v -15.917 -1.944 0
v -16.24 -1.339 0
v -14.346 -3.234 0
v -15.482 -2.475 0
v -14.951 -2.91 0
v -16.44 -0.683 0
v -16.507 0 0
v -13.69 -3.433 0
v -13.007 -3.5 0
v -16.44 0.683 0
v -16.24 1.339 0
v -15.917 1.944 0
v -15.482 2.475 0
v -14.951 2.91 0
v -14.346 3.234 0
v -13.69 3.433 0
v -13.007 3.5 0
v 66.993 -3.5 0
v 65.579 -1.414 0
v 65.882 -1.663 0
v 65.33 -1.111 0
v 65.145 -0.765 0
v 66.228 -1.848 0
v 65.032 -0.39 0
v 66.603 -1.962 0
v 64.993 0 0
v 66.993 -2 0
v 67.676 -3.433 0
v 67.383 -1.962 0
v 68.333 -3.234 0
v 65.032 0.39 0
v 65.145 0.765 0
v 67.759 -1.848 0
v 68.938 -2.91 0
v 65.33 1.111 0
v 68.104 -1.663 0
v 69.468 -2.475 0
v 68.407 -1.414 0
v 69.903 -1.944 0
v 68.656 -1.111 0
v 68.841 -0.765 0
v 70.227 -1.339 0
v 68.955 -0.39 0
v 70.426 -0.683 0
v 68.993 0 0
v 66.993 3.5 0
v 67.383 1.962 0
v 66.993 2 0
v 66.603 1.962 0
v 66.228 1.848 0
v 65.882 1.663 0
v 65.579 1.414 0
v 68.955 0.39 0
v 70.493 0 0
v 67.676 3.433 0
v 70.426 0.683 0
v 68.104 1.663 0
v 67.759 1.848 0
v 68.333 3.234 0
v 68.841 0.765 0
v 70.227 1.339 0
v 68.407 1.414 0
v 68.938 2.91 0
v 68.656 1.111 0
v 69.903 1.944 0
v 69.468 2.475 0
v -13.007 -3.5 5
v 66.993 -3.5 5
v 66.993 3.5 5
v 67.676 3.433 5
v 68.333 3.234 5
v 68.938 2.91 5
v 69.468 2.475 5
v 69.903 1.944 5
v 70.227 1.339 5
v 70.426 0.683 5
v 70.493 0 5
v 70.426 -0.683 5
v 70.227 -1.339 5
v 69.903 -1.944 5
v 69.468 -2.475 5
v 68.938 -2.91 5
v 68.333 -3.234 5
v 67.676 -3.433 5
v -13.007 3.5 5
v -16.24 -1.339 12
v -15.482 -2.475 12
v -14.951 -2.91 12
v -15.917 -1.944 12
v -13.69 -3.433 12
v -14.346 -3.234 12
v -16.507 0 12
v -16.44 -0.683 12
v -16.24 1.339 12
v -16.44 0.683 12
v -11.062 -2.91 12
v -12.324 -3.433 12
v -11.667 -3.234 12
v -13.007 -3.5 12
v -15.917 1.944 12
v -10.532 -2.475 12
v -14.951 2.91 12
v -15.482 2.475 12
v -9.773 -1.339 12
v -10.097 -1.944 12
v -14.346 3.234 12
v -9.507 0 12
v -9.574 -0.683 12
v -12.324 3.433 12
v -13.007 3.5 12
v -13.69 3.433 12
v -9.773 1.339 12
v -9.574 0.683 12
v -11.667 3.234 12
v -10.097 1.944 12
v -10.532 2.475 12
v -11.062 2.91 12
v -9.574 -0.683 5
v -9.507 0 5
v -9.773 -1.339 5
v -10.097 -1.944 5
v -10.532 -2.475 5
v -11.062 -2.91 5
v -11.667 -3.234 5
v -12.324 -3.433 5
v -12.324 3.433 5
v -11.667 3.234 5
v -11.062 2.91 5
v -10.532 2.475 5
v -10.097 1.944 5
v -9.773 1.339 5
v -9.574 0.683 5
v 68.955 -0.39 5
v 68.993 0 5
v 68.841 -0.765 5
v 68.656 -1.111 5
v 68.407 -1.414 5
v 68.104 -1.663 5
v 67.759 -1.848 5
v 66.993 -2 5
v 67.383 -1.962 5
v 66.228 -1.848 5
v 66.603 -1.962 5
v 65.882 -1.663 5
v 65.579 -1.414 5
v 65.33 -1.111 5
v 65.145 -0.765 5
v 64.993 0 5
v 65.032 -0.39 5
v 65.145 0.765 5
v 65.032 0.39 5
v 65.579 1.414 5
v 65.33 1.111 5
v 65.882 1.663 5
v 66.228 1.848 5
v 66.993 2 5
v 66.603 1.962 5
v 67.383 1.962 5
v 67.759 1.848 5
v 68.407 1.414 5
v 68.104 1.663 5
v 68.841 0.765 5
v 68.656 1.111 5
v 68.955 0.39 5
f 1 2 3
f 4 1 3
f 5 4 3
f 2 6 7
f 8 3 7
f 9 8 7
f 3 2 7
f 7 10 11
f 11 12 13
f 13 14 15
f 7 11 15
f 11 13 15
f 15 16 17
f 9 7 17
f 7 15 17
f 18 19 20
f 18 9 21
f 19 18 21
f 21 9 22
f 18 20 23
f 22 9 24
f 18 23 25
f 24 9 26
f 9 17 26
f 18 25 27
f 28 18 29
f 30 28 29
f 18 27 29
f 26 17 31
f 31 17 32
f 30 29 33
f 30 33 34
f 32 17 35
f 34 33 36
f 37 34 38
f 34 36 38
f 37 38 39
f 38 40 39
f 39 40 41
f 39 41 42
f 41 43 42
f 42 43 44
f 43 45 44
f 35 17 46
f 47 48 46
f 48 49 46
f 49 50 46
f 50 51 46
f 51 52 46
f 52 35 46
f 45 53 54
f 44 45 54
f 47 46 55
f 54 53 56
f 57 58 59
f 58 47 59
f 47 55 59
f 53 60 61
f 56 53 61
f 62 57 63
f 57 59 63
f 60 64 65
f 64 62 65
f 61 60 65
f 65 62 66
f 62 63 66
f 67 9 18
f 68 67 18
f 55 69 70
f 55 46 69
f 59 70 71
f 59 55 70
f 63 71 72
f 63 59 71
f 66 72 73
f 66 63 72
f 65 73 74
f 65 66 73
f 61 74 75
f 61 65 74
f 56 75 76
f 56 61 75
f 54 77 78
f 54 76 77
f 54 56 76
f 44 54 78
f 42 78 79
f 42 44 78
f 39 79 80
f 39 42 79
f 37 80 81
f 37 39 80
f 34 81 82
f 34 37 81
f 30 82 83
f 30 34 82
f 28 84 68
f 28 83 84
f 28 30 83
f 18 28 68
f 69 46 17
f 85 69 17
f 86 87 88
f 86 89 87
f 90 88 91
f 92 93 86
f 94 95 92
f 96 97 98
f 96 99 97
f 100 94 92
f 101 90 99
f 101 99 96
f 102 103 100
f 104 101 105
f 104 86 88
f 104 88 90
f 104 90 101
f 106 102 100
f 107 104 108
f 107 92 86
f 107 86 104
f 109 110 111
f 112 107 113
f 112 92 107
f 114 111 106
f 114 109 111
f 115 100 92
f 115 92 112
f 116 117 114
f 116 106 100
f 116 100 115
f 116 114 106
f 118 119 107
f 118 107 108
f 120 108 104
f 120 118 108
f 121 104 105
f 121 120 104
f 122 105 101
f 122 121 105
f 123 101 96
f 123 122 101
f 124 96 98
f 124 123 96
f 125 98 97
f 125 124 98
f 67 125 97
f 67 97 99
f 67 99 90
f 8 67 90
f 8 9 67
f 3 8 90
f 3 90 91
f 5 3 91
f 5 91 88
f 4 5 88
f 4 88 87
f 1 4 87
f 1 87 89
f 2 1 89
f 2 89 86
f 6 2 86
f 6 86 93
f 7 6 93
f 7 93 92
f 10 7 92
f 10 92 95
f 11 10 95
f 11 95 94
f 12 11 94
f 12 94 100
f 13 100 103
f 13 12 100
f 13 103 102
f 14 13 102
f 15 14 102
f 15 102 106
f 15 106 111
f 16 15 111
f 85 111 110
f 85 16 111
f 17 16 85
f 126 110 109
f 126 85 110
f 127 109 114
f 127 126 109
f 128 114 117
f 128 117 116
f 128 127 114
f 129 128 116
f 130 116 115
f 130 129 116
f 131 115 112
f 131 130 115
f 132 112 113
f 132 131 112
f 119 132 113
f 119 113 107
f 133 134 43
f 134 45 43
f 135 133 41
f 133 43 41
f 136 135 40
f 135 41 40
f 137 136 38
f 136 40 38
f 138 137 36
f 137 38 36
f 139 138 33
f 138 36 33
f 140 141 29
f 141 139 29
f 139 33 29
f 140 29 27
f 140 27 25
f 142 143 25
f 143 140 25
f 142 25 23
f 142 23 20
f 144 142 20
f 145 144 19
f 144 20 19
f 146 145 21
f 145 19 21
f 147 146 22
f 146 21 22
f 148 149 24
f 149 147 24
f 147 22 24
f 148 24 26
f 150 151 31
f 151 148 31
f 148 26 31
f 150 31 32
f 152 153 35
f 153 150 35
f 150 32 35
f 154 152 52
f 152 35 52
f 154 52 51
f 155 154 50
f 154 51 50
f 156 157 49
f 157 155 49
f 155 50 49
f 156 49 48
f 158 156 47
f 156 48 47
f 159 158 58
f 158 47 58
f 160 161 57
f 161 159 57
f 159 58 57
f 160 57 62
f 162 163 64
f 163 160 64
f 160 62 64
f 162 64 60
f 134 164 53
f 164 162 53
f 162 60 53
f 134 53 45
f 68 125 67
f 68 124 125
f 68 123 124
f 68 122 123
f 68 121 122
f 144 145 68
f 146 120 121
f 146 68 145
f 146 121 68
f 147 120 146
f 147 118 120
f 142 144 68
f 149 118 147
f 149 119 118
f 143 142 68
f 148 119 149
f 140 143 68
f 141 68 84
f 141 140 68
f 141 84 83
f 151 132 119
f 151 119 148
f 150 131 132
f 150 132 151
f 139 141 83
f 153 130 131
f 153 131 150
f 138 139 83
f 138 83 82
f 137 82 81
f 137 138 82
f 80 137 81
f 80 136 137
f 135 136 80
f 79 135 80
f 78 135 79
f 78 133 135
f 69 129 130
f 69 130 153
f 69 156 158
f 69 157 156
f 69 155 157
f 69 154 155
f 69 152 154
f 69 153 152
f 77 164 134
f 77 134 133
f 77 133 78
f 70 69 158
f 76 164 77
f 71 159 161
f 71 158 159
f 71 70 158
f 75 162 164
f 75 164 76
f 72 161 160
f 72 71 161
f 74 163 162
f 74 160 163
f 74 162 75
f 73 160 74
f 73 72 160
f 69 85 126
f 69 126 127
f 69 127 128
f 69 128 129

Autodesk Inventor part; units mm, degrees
ref_plane "YZ Plane" through (0, 0, 0) normal (1, 0, 0) x (0, 1, 0)
ref_plane "XZ Plane" through (0, 0, 0) normal (0, 1, 0) x (-1, 0, 0)
ref_plane "XY Plane" through (0, 0, 0) normal (0, 0, 1) x (1, 0, 0)
sketch "Boceto1" plane through (0, 0, 0) normal (0, 0, 1) x (1, 0, 0)
  line L0 (-13.0068, 0) -> (66.9932, 0) construction
  line L1 (-13.0068, -3.5) -> (66.9932, -3.5)
  line L2 (66.9932, 3.5) -> (-13.0068, 3.5)
  arc A0 (-13.0068, 3.5) -> (-13.0068, -3.5) centre (-13.0068, 0) ccw
  arc A1 (66.9932, -3.5) -> (66.9932, 3.5) centre (66.9932, 0) ccw
  circle A2 centre (66.9932, 0) radius 2
  point P0 (0, 0)
  point P1 (26.9932, 0)
  dimension "d0" = 80
  dimension "d1" = 7
  dimension "d2" = 4
extrude "Extrusión1" add sketch "Boceto1" along normal blind 5
sketch "Boceto3" plane through (0, 0, 5) normal (0, 0, 1) x (1, 0, 0)
  line L0 (66.9932, 3.5) -> (-13.0068, 3.5) projected
  circle A0 centre (-13.0068, 0) radius 3.5
  point P0 (0, 0)
extrude "Extrusión3" add sketch "Boceto3" along normal blind 7
properties part number "L3" material "Aluminio 6061"
